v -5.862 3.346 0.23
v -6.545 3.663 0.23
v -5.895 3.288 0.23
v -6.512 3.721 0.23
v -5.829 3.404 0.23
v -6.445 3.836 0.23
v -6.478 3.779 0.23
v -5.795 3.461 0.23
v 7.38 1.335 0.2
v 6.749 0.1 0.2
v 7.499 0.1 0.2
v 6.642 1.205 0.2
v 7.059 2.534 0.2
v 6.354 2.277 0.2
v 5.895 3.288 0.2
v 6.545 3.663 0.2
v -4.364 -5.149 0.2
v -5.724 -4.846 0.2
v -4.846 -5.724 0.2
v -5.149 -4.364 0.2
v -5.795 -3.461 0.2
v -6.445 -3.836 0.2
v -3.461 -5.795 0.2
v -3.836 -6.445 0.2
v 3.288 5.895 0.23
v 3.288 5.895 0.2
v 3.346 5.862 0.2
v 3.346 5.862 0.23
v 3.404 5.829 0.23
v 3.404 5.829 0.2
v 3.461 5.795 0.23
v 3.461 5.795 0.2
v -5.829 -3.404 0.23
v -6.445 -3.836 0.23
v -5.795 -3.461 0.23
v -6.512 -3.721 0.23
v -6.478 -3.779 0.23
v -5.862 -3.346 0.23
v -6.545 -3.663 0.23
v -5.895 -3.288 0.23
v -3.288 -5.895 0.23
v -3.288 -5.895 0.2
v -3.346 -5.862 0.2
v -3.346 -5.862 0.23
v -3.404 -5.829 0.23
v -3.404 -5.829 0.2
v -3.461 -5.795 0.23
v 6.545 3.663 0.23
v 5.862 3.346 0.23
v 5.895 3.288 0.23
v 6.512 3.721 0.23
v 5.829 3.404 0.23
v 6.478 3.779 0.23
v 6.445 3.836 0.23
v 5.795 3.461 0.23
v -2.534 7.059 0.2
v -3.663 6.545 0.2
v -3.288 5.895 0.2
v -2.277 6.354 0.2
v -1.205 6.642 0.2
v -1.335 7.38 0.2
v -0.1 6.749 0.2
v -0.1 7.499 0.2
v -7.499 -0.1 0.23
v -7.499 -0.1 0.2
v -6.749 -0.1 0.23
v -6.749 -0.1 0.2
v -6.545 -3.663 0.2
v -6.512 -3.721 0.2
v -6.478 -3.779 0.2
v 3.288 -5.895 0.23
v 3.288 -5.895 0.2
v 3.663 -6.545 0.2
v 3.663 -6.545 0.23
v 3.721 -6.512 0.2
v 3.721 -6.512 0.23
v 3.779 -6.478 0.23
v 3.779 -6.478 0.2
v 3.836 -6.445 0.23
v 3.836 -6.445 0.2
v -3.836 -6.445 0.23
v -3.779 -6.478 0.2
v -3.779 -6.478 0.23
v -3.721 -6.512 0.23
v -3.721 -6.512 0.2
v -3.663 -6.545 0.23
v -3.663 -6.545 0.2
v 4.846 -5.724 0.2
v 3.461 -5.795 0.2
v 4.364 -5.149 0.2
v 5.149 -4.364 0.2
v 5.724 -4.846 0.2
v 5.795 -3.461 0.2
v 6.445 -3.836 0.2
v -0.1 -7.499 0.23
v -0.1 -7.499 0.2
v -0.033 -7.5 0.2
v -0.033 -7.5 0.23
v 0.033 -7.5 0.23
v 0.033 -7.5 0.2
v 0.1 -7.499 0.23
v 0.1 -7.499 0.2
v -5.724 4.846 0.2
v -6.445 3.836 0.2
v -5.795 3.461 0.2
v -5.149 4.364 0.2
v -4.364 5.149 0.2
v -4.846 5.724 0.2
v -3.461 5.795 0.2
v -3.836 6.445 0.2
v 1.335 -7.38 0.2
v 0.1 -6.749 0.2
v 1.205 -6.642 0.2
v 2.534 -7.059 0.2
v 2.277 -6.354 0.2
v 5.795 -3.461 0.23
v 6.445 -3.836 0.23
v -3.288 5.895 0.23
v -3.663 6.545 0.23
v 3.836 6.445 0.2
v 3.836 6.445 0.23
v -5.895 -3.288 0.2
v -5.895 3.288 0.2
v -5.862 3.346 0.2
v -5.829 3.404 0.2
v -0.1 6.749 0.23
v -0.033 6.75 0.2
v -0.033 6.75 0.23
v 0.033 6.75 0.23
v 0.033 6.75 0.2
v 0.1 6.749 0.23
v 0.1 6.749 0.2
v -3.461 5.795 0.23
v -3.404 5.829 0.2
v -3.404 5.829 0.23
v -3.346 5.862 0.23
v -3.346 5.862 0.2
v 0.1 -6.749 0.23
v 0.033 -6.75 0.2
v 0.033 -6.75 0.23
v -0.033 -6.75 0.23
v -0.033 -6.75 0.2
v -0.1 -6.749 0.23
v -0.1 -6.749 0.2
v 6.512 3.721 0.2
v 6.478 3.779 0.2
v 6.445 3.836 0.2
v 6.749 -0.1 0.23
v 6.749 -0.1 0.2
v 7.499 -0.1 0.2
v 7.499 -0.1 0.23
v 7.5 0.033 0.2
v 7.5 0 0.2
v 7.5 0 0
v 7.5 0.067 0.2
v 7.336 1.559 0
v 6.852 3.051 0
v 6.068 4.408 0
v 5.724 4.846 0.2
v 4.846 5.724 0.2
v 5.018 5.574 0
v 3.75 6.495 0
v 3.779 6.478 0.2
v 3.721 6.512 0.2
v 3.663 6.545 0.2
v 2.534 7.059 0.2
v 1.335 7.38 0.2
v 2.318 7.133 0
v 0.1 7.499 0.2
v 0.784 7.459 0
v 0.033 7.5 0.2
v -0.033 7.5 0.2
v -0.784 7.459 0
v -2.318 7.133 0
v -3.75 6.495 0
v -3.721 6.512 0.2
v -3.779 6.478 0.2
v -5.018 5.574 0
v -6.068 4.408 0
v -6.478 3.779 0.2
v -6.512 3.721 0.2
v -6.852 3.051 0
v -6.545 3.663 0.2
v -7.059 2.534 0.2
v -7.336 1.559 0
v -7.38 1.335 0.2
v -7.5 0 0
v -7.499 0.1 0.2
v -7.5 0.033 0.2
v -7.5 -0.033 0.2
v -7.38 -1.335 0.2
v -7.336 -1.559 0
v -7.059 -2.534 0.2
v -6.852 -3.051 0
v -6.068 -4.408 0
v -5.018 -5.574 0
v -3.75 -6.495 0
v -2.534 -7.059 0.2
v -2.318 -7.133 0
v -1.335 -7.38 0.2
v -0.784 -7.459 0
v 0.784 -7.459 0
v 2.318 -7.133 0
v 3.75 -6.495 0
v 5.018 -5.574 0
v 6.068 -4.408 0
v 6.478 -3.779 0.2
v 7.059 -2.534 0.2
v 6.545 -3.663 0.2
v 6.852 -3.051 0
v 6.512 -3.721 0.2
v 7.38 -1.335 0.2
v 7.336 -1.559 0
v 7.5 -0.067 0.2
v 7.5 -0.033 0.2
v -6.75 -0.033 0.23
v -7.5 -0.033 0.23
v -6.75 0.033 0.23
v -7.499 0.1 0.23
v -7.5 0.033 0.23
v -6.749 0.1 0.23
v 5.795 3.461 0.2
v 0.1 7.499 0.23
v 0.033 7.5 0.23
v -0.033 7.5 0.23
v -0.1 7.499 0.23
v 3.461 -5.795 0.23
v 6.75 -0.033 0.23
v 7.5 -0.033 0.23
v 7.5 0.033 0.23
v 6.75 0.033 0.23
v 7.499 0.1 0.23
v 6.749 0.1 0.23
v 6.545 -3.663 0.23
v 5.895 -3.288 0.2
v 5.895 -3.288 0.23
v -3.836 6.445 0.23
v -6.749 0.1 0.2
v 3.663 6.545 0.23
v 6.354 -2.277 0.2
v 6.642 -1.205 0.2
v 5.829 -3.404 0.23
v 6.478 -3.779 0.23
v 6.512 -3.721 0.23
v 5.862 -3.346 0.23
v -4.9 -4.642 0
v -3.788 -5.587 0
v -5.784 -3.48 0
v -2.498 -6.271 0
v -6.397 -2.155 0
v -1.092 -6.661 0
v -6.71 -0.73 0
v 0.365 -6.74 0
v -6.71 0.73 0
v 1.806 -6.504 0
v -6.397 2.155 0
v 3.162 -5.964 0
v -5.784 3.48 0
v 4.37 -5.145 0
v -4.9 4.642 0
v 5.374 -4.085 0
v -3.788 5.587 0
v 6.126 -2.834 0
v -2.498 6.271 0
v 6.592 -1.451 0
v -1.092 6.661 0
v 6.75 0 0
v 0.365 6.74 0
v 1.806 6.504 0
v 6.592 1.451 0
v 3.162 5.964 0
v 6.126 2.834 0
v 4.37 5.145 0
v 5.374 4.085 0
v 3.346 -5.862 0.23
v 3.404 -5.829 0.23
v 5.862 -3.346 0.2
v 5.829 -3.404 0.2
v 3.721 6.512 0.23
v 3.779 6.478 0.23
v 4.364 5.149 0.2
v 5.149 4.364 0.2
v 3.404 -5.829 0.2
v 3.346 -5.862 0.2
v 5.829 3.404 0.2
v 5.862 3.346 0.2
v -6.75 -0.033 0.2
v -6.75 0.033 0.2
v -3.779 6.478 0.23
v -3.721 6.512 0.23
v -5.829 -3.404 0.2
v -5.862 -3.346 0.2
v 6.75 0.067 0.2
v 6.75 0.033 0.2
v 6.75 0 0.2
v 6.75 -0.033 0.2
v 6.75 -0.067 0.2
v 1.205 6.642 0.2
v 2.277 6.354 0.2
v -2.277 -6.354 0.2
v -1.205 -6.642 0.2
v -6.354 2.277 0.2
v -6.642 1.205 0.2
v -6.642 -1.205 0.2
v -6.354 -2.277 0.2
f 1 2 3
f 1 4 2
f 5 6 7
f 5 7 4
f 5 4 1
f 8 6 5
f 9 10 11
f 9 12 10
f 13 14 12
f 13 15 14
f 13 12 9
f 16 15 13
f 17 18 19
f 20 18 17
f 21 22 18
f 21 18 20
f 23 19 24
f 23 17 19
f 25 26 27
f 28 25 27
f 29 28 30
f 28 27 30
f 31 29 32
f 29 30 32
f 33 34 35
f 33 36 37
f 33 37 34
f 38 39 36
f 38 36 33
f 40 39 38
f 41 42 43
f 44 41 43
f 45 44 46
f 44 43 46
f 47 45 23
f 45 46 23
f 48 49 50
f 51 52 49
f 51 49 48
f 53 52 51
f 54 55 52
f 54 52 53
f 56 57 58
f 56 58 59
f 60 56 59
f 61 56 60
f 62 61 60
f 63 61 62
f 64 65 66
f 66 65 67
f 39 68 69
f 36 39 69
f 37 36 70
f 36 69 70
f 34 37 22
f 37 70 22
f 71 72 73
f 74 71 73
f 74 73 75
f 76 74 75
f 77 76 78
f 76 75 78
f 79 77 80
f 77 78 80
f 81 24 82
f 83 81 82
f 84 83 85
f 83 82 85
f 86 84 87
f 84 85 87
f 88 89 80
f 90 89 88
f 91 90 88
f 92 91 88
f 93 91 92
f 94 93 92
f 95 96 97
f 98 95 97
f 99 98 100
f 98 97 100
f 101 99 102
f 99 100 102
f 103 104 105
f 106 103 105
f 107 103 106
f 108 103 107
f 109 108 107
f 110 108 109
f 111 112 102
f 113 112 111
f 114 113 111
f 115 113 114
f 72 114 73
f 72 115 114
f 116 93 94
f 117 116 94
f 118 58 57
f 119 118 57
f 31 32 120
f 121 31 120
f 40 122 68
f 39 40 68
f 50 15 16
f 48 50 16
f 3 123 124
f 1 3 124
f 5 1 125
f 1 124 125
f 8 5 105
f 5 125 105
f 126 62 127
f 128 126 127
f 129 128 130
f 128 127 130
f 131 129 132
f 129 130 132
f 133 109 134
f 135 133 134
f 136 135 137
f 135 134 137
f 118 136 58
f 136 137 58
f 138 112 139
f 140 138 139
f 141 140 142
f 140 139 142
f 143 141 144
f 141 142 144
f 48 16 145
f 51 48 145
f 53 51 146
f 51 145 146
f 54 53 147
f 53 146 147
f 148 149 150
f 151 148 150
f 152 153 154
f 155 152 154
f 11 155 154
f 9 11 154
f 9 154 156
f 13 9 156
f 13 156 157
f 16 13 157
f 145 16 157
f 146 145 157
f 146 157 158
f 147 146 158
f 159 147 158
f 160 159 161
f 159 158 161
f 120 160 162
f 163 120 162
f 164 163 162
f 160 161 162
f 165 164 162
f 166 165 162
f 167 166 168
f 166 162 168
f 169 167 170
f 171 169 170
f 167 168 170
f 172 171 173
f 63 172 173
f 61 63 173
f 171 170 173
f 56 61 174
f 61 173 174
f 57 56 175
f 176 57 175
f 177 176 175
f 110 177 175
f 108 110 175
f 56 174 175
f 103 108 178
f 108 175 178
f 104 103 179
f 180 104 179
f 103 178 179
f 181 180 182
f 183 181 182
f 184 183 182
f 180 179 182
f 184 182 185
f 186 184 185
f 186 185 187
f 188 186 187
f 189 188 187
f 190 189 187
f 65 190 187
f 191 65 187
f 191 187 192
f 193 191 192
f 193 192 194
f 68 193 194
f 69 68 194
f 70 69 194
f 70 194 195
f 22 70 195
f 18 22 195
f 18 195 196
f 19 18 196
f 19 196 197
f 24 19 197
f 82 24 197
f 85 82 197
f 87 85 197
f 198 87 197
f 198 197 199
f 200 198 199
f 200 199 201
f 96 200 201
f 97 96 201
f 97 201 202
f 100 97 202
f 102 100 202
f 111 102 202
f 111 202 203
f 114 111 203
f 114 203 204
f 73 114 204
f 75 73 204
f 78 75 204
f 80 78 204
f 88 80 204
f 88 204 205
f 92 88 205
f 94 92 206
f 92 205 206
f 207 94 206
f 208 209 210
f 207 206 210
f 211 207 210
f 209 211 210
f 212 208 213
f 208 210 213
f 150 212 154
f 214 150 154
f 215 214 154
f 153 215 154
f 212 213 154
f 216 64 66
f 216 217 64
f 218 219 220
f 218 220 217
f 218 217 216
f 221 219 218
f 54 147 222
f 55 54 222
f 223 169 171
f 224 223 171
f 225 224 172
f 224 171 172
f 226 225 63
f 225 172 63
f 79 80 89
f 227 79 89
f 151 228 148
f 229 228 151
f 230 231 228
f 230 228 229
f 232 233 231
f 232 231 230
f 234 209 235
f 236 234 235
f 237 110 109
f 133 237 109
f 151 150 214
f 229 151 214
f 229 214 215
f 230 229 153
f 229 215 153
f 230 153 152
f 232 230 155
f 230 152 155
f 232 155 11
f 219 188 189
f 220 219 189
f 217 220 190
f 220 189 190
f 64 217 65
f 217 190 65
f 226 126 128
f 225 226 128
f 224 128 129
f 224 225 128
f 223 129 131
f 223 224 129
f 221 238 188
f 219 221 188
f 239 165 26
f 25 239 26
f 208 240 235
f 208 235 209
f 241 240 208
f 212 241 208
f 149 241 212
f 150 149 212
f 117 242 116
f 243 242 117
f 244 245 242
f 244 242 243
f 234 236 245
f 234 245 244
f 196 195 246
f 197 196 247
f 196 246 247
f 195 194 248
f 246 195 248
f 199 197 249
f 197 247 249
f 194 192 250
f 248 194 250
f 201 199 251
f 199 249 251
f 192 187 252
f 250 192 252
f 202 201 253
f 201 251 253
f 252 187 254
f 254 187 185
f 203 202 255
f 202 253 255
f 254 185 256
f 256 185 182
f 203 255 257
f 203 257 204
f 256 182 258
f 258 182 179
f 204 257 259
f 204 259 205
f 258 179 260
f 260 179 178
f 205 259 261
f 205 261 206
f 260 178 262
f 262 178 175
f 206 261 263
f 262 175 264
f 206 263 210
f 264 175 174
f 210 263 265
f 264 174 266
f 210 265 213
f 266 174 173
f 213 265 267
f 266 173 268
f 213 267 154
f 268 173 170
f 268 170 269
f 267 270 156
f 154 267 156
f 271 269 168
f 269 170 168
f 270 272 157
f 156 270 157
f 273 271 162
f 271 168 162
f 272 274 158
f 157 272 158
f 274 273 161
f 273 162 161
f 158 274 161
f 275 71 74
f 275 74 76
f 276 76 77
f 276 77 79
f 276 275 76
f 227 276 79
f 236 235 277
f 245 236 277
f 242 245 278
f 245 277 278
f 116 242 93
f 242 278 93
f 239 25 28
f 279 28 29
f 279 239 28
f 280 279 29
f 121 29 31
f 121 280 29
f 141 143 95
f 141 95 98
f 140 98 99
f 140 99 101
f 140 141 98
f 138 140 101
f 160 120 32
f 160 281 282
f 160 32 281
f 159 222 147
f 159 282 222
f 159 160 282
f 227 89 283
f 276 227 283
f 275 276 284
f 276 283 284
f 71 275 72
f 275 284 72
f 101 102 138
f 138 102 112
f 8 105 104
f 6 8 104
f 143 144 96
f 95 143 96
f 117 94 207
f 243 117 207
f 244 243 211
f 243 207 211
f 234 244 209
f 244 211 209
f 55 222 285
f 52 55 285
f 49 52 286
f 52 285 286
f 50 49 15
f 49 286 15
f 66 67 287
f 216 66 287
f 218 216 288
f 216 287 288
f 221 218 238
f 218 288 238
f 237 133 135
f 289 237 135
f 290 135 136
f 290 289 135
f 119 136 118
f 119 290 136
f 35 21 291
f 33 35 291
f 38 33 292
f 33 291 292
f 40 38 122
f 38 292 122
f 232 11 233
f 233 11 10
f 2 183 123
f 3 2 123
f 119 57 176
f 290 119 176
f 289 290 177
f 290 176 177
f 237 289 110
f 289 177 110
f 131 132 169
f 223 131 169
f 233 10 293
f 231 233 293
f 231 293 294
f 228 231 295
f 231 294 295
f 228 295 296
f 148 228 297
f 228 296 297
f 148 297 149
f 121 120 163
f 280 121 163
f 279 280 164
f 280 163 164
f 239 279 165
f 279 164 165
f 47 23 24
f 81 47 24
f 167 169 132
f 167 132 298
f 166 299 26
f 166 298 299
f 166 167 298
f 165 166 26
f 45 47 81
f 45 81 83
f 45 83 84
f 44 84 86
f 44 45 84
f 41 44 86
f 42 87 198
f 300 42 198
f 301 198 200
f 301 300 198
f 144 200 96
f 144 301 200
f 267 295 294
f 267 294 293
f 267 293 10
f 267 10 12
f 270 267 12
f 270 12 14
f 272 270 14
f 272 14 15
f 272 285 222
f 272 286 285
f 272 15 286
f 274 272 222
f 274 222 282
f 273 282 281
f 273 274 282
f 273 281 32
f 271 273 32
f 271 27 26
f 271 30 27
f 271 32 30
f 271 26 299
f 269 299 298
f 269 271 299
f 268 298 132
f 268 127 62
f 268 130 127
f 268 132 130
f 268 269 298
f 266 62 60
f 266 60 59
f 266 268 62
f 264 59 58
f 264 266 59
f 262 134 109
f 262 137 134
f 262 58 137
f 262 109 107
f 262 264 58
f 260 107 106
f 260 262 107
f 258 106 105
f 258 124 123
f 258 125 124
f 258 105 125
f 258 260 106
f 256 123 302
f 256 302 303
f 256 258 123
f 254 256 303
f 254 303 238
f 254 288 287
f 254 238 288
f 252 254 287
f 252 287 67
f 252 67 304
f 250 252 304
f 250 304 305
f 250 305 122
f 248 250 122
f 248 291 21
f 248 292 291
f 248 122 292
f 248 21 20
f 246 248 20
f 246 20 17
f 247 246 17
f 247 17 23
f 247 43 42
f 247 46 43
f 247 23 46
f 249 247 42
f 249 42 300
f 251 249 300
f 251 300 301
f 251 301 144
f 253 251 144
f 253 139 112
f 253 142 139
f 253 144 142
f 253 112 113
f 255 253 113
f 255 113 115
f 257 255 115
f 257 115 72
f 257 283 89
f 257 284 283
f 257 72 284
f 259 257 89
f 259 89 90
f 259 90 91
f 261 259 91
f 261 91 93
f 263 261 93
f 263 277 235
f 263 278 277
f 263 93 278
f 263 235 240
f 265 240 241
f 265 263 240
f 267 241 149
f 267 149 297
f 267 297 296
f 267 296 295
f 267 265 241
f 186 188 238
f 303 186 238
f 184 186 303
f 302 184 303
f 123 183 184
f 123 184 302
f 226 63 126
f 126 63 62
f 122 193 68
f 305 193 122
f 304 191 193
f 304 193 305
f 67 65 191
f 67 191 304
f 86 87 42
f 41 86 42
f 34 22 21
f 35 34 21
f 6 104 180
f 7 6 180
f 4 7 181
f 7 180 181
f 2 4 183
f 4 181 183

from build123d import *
from build123d.topology import SkipClean

# Parameters (mm, degrees)
SKETCH1_R           = 7.5
SKETCH1_R_2         = 6.75
BOSS_EXTRUDE1_DEPTH = 0.2
BOSS_EXTRUDE3_DEPTH = 0.03


with BuildPart() as part:
    # Sketch1 → Boss-Extrude1 (new body)
    with BuildSketch(Plane.XY):
        Circle(SKETCH1_R)
        Circle(SKETCH1_R_2, mode=Mode.SUBTRACT)
    extrude(amount=BOSS_EXTRUDE1_DEPTH)

    # Sketch2 → Boss-Extrude3 (add)
    with SkipClean():  # the faces are left unmerged after this step: merging them gives an invalid solid
        with BuildSketch(Plane.XY.offset(0.2)):
            with BuildLine():
                Line((3.663064111, 6.544613152), (3.288027069, 5.89502994))
                ThreePointArc((3.288027069, 5.89502994), (3.375, 5.845671476), (3.46123215, 5.79502994))
                Line((3.46123215, 5.79502994), (3.836269192, 6.444613152))
                ThreePointArc((3.836269192, 6.444613152), (3.75, 6.495190528), (3.663064111, 6.544613152))
            make_face()
            with BuildLine():
                Line((-0.1, 7.499333304), (-0.1, 6.749259219))
                ThreePointArc((-0.1, 6.749259219), (0, 6.75), (0.1, 6.749259219))
                Line((0.1, 6.749259219), (0.1, 7.499333304))
                ThreePointArc((0.1, 7.499333304), (0, 7.5), (-0.1, 7.499333304))
            make_face()
            with BuildLine():
                Line((6.444613152, 3.836269192), (5.79502994, 3.46123215))
                ThreePointArc((5.79502994, 3.46123215), (5.845671476, 3.375), (5.89502994, 3.288027069))
                Line((5.89502994, 3.288027069), (6.544613152, 3.663064111))
                ThreePointArc((6.544613152, 3.663064111), (6.495190528, 3.75), (6.444613152, 3.836269192))
            make_face()
            with BuildLine():
                Line((7.499333304, 0.1), (6.749259219, 0.1))
                ThreePointArc((6.749259219, 0.1), (6.75, 0), (6.749259219, -0.1))
                Line((6.749259219, -0.1), (7.499333304, -0.1))
                ThreePointArc((7.499333304, -0.1), (7.5, 0), (7.499333304, 0.1))
            make_face()
            with BuildLine():
                Line((6.544613152, -3.663064111), (5.89502994, -3.288027069))
                ThreePointArc((5.89502994, -3.288027069), (5.845671476, -3.375), (5.79502994, -3.46123215))
                Line((5.79502994, -3.46123215), (6.444613152, -3.836269192))
                ThreePointArc((6.444613152, -3.836269192), (6.495190528, -3.75), (6.544613152, -3.663064111))
            make_face()
            with BuildLine():
                Line((3.836269192, -6.444613152), (3.46123215, -5.79502994))
                ThreePointArc((3.46123215, -5.79502994), (3.375, -5.845671476), (3.288027069, -5.89502994))
                Line((3.288027069, -5.89502994), (3.663064111, -6.544613152))
                ThreePointArc((3.663064111, -6.544613152), (3.75, -6.495190528), (3.836269192, -6.444613152))
            make_face()
            with BuildLine():
                Line((0.1, -7.499333304), (0.1, -6.749259219))
                ThreePointArc((0.1, -6.749259219), (0, -6.75), (-0.1, -6.749259219))
                Line((-0.1, -6.749259219), (-0.1, -7.499333304))
                ThreePointArc((-0.1, -7.499333304), (0, -7.5), (0.1, -7.499333304))
            make_face()
            with BuildLine():
                Line((-3.663064111, -6.544613152), (-3.288027069, -5.89502994))
                ThreePointArc((-3.288027069, -5.89502994), (-3.375, -5.845671476), (-3.46123215, -5.79502994))
                Line((-3.46123215, -5.79502994), (-3.836269192, -6.444613152))
                ThreePointArc((-3.836269192, -6.444613152), (-3.75, -6.495190528), (-3.663064111, -6.544613152))
            make_face()
            with BuildLine():
                Line((-6.444613152, -3.836269192), (-5.79502994, -3.46123215))
                ThreePointArc((-5.79502994, -3.46123215), (-5.845671476, -3.375), (-5.89502994, -3.288027069))
                Line((-5.89502994, -3.288027069), (-6.544613152, -3.663064111))
                ThreePointArc((-6.544613152, -3.663064111), (-6.495190528, -3.75), (-6.444613152, -3.836269192))
            make_face()
            with BuildLine():
                Line((-7.499333304, -0.1), (-6.749259219, -0.1))
                ThreePointArc((-6.749259219, -0.1), (-6.75, 0), (-6.749259219, 0.1))
                Line((-6.749259219, 0.1), (-7.499333304, 0.1))
                ThreePointArc((-7.499333304, 0.1), (-7.5, 0), (-7.499333304, -0.1))
            make_face()
            with BuildLine():
                Line((-6.544613152, 3.663064111), (-5.89502994, 3.288027069))
                ThreePointArc((-5.89502994, 3.288027069), (-5.845671476, 3.375), (-5.79502994, 3.46123215))
                Line((-5.79502994, 3.46123215), (-6.444613152, 3.836269192))
                ThreePointArc((-6.444613152, 3.836269192), (-6.495190528, 3.75), (-6.544613152, 3.663064111))
            make_face()
            with BuildLine():
                Line((-3.836269192, 6.444613152), (-3.46123215, 5.79502994))
                ThreePointArc((-3.46123215, 5.79502994), (-3.375, 5.845671476), (-3.288027069, 5.89502994))
                Line((-3.288027069, 5.89502994), (-3.663064111, 6.544613152))
                ThreePointArc((-3.663064111, 6.544613152), (-3.75, 6.495190528), (-3.836269192, 6.444613152))
            make_face()
        extrude(amount=BOSS_EXTRUDE3_DEPTH)


solid = part.part
